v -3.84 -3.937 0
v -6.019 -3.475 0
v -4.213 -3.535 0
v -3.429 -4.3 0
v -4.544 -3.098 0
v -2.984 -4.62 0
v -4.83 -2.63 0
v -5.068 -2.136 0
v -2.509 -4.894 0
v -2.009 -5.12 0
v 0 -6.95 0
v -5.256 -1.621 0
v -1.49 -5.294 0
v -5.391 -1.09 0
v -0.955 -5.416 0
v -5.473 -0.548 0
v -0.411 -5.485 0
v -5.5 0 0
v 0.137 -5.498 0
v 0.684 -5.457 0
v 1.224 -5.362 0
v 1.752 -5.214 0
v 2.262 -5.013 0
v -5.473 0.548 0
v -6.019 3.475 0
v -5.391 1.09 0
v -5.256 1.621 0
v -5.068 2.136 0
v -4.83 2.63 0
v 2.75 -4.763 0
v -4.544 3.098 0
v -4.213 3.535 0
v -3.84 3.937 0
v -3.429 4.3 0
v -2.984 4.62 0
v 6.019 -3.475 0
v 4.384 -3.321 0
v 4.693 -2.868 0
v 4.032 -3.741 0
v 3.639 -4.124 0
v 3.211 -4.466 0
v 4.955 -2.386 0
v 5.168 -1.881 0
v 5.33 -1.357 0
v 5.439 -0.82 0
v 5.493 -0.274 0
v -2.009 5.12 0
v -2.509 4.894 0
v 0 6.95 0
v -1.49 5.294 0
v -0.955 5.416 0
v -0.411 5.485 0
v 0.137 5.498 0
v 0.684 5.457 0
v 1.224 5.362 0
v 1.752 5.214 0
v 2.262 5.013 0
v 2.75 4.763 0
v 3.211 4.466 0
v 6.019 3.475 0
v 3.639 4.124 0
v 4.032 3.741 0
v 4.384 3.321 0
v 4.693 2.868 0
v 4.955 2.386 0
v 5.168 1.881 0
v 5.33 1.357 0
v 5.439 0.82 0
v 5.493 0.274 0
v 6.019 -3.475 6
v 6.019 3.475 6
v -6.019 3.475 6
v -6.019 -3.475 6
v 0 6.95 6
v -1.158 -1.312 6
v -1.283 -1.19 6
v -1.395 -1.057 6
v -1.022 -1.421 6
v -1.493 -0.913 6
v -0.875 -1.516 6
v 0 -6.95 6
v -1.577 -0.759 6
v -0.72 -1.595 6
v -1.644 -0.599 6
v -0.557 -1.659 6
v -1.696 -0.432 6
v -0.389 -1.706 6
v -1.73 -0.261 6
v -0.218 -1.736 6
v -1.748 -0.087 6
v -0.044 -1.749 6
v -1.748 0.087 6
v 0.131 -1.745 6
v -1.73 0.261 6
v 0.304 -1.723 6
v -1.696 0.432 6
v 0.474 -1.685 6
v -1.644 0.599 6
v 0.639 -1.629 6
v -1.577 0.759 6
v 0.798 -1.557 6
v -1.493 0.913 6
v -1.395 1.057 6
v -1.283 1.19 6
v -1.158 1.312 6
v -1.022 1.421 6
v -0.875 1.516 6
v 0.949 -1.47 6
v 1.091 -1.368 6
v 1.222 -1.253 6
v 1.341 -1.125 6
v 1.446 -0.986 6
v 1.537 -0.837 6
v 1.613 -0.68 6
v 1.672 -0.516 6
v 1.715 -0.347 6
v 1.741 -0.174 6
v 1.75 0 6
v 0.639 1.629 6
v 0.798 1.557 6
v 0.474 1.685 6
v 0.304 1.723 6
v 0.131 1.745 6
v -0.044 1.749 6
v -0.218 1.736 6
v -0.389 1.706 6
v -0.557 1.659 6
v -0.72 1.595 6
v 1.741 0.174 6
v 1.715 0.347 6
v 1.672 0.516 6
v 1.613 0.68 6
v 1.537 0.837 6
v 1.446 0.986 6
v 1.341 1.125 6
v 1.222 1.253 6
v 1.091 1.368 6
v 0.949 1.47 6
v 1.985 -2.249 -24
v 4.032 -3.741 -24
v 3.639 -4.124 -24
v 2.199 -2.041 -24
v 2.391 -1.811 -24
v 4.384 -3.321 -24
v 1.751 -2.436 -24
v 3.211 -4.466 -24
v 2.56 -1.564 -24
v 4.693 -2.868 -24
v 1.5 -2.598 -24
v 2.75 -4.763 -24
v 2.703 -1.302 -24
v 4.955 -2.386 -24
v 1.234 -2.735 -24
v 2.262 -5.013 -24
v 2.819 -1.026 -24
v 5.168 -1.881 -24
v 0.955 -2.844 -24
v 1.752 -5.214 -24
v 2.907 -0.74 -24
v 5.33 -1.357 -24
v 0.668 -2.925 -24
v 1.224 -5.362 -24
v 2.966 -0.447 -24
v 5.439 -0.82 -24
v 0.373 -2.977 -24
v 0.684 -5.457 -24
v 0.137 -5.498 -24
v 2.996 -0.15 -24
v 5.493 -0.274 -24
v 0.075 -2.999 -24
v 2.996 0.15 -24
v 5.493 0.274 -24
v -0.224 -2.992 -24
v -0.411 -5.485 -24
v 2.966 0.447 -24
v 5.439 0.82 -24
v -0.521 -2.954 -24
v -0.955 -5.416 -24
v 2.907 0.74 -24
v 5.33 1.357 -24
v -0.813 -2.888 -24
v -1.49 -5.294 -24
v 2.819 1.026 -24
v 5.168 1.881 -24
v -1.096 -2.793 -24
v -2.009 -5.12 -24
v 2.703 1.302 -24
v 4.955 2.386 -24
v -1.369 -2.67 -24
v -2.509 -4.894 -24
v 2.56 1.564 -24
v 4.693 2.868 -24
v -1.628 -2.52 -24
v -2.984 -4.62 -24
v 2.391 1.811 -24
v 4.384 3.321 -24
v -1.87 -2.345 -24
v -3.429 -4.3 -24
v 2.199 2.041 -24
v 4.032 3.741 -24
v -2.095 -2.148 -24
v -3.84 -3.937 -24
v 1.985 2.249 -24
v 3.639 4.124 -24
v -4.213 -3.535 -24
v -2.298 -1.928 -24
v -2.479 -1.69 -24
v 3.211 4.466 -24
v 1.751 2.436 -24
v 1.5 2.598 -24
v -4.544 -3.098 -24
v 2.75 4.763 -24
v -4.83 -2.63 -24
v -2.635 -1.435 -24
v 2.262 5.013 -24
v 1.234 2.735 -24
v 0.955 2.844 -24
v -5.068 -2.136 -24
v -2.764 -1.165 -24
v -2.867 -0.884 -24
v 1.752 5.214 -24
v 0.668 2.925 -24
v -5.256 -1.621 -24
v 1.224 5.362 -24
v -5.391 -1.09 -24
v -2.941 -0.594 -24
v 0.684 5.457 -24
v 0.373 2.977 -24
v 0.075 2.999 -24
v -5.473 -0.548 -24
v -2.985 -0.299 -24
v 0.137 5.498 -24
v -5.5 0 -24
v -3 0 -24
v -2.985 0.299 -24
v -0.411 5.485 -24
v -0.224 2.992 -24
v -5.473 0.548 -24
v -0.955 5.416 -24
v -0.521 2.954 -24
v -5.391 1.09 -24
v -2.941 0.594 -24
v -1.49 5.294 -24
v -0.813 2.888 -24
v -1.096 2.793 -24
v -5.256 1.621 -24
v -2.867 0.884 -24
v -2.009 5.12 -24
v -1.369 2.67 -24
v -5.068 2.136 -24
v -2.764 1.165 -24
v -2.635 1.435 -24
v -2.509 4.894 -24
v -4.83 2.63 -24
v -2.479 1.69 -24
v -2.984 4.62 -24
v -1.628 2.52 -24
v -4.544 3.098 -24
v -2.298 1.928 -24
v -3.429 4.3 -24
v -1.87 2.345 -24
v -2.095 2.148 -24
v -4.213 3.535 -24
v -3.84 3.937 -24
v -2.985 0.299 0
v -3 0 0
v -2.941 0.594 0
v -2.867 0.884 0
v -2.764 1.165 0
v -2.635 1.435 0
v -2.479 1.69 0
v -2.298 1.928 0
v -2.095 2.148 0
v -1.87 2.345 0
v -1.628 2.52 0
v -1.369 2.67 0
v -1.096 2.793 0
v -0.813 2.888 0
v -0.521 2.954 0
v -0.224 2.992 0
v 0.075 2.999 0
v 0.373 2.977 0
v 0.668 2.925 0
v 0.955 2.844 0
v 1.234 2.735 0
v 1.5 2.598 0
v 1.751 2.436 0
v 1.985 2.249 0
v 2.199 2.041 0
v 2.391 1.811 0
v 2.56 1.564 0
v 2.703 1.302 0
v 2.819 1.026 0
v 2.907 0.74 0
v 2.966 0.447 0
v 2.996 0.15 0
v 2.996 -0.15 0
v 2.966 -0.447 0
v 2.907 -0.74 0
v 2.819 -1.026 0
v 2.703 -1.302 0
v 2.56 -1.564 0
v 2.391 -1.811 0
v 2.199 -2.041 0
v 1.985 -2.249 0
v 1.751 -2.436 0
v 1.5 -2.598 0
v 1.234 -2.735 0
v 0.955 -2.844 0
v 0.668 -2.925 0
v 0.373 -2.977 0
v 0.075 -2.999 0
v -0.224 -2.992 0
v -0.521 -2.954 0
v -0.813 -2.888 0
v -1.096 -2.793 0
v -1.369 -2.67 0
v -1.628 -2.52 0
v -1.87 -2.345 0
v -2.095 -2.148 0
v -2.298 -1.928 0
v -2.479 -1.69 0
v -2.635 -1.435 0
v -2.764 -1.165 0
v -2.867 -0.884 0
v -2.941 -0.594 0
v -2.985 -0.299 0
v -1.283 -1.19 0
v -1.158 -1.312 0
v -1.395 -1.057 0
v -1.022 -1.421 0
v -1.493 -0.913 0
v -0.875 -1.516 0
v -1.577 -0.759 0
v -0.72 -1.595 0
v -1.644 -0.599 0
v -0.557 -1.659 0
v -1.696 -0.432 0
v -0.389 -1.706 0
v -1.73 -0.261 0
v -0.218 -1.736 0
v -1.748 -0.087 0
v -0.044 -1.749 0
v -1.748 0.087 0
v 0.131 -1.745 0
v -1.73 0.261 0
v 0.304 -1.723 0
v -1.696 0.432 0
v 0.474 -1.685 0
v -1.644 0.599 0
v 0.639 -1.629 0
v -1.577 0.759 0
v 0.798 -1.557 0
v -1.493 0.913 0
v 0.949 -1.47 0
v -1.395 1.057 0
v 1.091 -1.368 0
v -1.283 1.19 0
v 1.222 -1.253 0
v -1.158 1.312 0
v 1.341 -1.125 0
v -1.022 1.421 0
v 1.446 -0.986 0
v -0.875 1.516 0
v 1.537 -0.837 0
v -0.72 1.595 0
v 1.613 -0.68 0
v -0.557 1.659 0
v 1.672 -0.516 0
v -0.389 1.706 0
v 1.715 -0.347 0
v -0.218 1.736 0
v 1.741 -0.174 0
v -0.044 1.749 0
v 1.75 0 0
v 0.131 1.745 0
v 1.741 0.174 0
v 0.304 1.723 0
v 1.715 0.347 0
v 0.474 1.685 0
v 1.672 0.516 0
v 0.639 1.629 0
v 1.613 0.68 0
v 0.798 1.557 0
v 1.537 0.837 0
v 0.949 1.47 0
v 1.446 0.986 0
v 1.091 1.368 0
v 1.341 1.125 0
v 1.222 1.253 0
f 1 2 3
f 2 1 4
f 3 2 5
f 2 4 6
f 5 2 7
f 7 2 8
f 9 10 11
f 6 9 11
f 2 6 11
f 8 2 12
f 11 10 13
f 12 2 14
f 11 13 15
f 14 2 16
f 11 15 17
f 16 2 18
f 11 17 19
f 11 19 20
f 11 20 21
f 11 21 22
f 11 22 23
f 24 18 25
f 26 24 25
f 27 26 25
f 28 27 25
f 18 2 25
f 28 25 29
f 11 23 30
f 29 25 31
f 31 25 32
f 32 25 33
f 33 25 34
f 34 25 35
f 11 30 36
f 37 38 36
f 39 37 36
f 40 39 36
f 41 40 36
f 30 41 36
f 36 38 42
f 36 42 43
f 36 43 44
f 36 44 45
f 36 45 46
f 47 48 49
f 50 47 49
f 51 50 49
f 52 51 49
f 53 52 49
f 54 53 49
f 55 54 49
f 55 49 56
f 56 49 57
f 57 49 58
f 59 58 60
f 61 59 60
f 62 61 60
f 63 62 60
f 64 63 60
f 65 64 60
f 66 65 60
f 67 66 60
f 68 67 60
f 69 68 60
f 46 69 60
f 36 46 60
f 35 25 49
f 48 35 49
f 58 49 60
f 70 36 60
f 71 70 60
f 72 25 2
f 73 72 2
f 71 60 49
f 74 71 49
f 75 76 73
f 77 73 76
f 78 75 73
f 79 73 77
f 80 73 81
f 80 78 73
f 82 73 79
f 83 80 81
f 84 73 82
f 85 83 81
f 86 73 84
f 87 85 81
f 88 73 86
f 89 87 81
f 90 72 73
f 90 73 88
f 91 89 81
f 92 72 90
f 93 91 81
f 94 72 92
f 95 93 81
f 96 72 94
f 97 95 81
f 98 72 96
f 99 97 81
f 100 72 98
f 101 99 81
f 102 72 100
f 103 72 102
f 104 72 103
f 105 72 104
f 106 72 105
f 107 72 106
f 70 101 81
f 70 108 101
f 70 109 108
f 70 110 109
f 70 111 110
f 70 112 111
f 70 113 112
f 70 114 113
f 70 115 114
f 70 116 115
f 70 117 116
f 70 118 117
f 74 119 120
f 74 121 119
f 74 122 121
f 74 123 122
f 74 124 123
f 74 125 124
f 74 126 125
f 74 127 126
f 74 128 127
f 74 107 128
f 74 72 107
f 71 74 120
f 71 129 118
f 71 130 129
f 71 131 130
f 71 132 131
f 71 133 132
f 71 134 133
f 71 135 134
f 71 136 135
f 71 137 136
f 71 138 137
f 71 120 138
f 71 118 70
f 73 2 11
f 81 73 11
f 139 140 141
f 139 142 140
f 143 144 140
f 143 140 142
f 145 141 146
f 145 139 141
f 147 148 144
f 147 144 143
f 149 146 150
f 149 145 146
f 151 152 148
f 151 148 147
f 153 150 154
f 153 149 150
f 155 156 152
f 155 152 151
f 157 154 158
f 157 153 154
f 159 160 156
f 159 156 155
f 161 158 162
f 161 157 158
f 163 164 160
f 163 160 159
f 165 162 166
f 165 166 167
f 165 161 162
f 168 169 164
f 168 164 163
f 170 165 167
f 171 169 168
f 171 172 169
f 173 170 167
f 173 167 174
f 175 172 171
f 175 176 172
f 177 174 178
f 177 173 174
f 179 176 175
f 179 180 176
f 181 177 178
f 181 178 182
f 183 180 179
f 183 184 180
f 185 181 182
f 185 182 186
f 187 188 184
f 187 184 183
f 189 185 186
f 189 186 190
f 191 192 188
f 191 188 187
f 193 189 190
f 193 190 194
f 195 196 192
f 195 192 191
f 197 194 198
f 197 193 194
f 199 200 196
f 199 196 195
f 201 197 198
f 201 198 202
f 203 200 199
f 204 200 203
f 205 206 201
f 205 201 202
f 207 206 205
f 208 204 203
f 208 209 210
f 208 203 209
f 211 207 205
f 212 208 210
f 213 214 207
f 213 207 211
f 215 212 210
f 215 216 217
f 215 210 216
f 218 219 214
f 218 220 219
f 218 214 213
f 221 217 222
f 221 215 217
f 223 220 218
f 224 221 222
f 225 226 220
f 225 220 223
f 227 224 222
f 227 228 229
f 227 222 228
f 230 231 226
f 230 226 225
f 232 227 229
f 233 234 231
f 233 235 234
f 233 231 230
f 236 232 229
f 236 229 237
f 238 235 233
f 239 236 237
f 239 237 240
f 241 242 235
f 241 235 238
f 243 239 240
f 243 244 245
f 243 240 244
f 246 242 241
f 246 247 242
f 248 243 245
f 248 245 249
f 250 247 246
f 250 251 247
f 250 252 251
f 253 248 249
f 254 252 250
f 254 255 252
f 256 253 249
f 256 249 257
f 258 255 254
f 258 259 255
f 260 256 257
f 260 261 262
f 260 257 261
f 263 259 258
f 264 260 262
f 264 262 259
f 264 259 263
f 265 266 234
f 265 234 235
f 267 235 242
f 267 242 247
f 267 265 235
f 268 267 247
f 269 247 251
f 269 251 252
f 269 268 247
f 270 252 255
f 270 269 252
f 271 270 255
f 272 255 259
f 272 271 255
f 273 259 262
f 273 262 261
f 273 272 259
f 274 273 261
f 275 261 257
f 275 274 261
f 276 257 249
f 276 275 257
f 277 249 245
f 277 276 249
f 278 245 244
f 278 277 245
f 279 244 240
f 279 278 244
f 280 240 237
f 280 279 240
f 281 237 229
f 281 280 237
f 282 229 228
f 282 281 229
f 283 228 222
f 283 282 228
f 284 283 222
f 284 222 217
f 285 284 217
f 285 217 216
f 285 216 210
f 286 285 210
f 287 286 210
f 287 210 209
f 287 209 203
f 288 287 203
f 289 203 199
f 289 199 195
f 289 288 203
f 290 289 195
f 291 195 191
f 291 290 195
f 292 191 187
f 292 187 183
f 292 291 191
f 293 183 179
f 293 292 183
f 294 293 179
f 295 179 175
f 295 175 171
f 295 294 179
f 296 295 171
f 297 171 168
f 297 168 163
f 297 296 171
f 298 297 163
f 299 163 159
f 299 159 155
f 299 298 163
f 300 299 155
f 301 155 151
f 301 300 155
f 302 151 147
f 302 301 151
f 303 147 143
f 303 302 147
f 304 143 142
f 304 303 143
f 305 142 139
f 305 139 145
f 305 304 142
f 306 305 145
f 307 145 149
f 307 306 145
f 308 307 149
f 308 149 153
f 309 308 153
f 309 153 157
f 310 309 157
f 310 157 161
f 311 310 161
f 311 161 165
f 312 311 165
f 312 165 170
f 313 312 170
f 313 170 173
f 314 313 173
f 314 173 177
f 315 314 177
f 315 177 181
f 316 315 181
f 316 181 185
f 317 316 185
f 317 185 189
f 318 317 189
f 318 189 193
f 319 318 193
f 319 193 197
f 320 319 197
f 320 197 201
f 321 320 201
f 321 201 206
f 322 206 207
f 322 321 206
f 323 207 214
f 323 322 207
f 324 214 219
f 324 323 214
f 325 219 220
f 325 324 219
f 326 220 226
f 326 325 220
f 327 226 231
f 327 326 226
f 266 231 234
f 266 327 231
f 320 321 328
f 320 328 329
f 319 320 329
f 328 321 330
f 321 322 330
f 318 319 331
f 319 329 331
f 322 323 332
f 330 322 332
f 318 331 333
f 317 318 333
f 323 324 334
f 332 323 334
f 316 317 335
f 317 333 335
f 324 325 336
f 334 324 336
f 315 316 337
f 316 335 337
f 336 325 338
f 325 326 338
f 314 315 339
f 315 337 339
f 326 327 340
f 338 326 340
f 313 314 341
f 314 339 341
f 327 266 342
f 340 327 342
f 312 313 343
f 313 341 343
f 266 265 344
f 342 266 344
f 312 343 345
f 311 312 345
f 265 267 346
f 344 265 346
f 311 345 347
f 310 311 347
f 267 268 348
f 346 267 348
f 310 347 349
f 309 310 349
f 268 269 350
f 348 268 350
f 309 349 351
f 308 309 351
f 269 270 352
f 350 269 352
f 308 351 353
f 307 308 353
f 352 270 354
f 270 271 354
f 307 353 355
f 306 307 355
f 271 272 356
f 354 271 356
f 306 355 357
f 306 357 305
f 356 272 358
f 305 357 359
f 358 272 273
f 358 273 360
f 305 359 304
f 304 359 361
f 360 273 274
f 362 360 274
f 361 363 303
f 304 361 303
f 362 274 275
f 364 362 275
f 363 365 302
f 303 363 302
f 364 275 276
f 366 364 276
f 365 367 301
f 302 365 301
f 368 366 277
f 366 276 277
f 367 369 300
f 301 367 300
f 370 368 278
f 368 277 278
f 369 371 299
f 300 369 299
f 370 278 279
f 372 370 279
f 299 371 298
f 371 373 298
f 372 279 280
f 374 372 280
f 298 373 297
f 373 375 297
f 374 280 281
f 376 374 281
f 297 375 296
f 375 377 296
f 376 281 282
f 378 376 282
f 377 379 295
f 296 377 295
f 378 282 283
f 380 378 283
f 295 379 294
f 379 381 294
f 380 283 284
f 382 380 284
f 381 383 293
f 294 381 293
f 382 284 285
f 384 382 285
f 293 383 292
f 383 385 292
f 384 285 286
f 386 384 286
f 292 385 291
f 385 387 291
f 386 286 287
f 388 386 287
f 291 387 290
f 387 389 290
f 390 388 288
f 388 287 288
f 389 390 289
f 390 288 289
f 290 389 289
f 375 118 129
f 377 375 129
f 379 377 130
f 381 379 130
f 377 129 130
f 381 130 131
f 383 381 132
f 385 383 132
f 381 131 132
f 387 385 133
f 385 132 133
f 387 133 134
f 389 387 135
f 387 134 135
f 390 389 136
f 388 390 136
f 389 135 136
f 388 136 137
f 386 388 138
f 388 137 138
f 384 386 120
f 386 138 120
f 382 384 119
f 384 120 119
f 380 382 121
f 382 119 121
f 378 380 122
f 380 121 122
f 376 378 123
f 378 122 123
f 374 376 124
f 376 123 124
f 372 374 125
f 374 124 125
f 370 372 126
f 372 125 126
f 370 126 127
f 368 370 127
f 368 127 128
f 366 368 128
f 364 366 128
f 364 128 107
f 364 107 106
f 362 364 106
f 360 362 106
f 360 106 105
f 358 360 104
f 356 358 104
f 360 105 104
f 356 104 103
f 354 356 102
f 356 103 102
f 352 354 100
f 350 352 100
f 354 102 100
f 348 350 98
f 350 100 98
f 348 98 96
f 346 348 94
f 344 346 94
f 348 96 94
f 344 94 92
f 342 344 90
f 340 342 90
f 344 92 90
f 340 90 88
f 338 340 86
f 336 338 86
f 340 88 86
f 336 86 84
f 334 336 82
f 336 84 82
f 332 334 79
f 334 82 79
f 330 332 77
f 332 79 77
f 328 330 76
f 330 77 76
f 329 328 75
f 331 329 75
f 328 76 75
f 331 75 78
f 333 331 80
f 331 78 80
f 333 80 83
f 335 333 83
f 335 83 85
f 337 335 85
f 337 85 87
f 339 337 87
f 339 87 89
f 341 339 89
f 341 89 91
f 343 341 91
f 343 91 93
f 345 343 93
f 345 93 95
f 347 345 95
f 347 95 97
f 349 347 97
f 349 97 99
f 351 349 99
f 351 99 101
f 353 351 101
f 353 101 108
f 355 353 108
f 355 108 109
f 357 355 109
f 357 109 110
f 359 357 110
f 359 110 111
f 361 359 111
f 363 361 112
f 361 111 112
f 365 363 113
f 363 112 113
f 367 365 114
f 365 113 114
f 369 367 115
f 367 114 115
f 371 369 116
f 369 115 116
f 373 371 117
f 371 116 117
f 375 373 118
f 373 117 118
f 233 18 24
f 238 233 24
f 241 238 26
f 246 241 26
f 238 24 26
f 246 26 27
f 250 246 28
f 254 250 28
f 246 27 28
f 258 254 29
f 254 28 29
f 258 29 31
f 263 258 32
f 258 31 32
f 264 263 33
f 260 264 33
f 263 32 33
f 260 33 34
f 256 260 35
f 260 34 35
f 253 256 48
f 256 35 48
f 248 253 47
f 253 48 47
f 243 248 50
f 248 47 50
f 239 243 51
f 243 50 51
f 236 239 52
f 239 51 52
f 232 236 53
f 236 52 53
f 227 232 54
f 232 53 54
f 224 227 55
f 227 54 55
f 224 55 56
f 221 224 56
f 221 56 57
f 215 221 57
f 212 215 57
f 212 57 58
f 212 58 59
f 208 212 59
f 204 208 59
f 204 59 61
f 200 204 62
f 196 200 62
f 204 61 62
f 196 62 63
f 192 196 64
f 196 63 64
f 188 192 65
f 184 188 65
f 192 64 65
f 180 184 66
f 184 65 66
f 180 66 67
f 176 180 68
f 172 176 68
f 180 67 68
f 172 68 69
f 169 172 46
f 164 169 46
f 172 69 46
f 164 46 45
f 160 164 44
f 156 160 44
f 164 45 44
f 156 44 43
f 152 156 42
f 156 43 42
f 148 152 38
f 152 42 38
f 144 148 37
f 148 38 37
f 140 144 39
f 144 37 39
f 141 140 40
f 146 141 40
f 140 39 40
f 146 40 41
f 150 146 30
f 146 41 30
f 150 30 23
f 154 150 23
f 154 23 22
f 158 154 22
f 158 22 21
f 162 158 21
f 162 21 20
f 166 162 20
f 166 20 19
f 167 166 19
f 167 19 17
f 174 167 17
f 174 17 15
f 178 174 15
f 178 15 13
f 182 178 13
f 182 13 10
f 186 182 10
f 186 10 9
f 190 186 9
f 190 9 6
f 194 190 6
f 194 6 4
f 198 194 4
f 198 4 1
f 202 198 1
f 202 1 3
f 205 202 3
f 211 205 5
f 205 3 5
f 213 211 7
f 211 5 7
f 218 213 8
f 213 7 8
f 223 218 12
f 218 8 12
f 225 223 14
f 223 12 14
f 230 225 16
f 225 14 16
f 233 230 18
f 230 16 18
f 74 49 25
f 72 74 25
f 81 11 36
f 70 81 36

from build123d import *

# Parameters (mm, degrees)
BOSS_EXTRUDE1_DEPTH = 6
SKETCH3_R           = 1.75
CUT_EXTRUDE1_DEPTH  = 6
SKETCH4_R           = 5.5
SKETCH4_R_2         = 3
BOSS_EXTRUDE2_DEPTH = 24


with BuildPart() as part:
    # Sketch2 → Boss-Extrude1 (new body)
    with BuildSketch(Plane.XY):
        Polygon((0, 6.95), (-6.018876556, 3.475), (-6.018876556, -3.475), (0, -6.95), (6.018876556, -3.475), (6.018876556, 3.475), align=None)
    extrude(amount=BOSS_EXTRUDE1_DEPTH)

    # Sketch3 → Cut-Extrude1 (cut)
    with BuildSketch(Plane.XY.offset(6)):
        Circle(SKETCH3_R)
    extrude(amount=-CUT_EXTRUDE1_DEPTH, mode=Mode.SUBTRACT)

    # Sketch4 → Boss-Extrude2 (add)
    with BuildSketch(Plane(origin=(0, 0, 0), x_dir=(-1, 0, 0), z_dir=(0, 0, -1))):
        Circle(SKETCH4_R)
        Circle(SKETCH4_R_2, mode=Mode.SUBTRACT)
    extrude(amount=BOSS_EXTRUDE2_DEPTH)


solid = part.part
